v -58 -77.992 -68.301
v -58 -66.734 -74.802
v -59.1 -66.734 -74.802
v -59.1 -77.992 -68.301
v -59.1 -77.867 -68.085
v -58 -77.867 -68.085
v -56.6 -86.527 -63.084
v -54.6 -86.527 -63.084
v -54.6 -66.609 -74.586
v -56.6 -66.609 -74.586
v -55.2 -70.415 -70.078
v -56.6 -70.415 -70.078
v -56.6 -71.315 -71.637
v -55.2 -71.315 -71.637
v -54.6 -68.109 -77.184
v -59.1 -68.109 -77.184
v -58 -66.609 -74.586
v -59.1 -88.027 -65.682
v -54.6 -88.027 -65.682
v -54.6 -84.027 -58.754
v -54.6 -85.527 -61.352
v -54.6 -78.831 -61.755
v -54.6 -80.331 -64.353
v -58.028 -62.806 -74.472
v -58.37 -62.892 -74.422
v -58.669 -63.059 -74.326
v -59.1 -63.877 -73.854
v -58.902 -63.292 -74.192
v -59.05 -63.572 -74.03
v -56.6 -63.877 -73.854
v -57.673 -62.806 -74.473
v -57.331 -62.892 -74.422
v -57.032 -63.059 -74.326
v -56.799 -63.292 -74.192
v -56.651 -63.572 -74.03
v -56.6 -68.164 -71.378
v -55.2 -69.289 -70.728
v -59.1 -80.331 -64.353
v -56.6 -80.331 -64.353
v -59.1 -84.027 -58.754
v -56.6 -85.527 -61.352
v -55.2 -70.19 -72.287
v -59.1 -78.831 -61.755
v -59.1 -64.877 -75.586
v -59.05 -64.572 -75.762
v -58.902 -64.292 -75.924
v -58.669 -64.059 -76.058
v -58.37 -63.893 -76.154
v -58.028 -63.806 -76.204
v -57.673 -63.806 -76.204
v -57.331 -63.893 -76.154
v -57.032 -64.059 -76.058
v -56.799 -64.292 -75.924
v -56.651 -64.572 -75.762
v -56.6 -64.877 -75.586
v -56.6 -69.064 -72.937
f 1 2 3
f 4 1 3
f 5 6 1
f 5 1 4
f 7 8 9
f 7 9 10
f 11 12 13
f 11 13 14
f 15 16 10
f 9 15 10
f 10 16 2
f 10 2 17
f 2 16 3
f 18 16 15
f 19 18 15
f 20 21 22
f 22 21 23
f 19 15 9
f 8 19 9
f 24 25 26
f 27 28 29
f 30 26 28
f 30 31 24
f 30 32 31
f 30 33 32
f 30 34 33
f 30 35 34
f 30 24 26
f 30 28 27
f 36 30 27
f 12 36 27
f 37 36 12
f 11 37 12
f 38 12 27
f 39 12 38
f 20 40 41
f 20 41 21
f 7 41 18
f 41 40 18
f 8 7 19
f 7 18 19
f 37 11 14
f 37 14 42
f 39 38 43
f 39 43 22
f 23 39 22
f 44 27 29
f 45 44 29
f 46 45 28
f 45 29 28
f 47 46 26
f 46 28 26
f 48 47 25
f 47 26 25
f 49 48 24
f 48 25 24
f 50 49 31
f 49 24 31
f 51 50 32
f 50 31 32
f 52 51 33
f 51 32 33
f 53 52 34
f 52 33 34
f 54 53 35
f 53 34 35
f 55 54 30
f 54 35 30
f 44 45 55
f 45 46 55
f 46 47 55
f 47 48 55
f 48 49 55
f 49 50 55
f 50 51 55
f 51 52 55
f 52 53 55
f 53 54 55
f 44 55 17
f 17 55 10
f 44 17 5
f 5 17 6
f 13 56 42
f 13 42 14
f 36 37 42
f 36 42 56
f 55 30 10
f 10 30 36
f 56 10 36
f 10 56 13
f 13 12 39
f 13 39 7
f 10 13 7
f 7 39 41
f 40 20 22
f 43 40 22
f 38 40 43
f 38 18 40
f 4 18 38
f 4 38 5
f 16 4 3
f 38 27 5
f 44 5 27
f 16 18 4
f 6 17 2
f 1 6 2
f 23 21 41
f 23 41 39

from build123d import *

# Parameters (mm, degrees)
PAD022_DEPTH            = 2
BOX028_W                = 10
BOX028_H                = 4.5
BOX028_DEPTH            = 3
PAD023_DEPTH            = 13
PAD024_DEPTH            = 1.8
BOX029_W                = 6
BOX029_H                = 4.5
BOX029_DEPTH            = 3
BODY012_ROLL_ANGLE      = -0.000328
BODY012_PITCH_ANGLE     = 30.004371
BODY012_PLACEMENT_ANGLE = 89.998778


with BuildPart() as body012:
    # Sketch042 → Pad022 (new body)
    with BuildSketch(Plane(origin=(0, -0.1, 0.2), x_dir=(1, 0, 0), z_dir=(0, 0, 1))):
        with BuildLine():
            Line((24, -2.5), (-1, -2.5))
            Line((-1, -2.5), (-1, 0))
            Line((24, 0), (-1, 0))
            ThreePointArc((24, -2.5), (25.25, -1.25), (24, 0))
        make_face()
    extrude(amount=-PAD022_DEPTH)

    # Box028 → Box028 (join)
    with BuildSketch(Plane(origin=(-1, 1.9, -1.8), x_dir=(1, 0, 0), z_dir=(0, 0, -1))):
        with Locations((5, 2.25)):
            Rectangle(BOX028_W, BOX028_H)
    extrude(amount=BOX028_DEPTH)

    # Sketch043 (on Plane of DatumPlane011) → Pad023 (join)
    with BuildSketch(Plane(origin=(9, -2.6, -4.8), x_dir=(0, 0, 1), z_dir=(1, 0, 0))):
        Polygon((0, 0), (0, -4.5), (3, -4.5), (3, -1.1), (2.75, -1.1), (2.75, 0), align=None)
    extrude(amount=PAD023_DEPTH)

    # Sketch044 (on Plane of DatumPlane002) → Pad024 (join)
    with BuildSketch(Plane.XY.offset(0.2)):
        Polygon((16.45, -0.1), (16.45, 1.3), (17.75, 1.3), (19.05, -0.1), align=None)
    extrude(amount=-PAD024_DEPTH)

    # Box029 → Box029 (join)
    with BuildSketch(Plane(origin=(-1, -2.6, 0.2), x_dir=(1, 0, 0), z_dir=(0, 0, 1))):
        with Locations((3, 2.25)):
            Rectangle(BOX029_W, BOX029_H)
    extrude(amount=BOX029_DEPTH)


with BuildPart() as body012_1:
    # Body012 roll: moved
    add(body012.part.rotate(Axis((0, 0, 0), (1, 0, 0)), BODY012_ROLL_ANGLE))


with BuildPart() as body012_2:
    # Body012 pitch: moved
    add(body012_1.part.rotate(Axis((0, 0, 0), (0, 1, 0)), BODY012_PITCH_ANGLE))


with BuildPart() as body012_3:
    # Body012 placement: moved
    add(body012_2.part.moved(Location((-34.500058, -84.760808, -62.025399))).rotate(Axis((-34.500058, -84.760808, -62.025399), (0, 0, 1)), BODY012_PLACEMENT_ANGLE))


with BuildPart() as body_mirrored:
    # mirror: instance of Body012
    add(body012_3.part.mirror(Plane(origin=(-11, 23.3, 0), x_dir=(0, 1, 0), z_dir=(-1, 0, 0))))


with BuildPart() as body_mirrored_1:
    # mirror placement: moved
    add(body_mirrored.part.moved(Location((-69, 0, 0))))


solid = body_mirrored_1.part
